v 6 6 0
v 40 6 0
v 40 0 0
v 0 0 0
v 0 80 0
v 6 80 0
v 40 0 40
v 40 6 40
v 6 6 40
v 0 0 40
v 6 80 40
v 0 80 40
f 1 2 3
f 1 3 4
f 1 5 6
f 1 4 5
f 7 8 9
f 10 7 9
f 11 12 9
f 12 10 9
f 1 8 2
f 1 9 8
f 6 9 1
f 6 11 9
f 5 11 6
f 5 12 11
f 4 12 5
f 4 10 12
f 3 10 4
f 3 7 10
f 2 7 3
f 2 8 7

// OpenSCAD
$fn = 32;

// ----------------------------------------------------------------------
// Structural section: angle 40 x 80 mm
// ----------------------------------------------------------------------

// --- parameters (mm) ---
sec_w = 40;               // leg width, X
sec_h = 80;               // leg height, Y
flange_t = 6;             // leg thickness
plate_t = 40;             // cut length, Z (extrusion height)

profile = [[0, 0], [40, 0], [40, 6], [6, 6], [6, 80], [0, 80]];  // primary outline, 6 points, counter clockwise

// --- the one profile operation ---
linear_extrude(height = plate_t) polygon(points = profile);
